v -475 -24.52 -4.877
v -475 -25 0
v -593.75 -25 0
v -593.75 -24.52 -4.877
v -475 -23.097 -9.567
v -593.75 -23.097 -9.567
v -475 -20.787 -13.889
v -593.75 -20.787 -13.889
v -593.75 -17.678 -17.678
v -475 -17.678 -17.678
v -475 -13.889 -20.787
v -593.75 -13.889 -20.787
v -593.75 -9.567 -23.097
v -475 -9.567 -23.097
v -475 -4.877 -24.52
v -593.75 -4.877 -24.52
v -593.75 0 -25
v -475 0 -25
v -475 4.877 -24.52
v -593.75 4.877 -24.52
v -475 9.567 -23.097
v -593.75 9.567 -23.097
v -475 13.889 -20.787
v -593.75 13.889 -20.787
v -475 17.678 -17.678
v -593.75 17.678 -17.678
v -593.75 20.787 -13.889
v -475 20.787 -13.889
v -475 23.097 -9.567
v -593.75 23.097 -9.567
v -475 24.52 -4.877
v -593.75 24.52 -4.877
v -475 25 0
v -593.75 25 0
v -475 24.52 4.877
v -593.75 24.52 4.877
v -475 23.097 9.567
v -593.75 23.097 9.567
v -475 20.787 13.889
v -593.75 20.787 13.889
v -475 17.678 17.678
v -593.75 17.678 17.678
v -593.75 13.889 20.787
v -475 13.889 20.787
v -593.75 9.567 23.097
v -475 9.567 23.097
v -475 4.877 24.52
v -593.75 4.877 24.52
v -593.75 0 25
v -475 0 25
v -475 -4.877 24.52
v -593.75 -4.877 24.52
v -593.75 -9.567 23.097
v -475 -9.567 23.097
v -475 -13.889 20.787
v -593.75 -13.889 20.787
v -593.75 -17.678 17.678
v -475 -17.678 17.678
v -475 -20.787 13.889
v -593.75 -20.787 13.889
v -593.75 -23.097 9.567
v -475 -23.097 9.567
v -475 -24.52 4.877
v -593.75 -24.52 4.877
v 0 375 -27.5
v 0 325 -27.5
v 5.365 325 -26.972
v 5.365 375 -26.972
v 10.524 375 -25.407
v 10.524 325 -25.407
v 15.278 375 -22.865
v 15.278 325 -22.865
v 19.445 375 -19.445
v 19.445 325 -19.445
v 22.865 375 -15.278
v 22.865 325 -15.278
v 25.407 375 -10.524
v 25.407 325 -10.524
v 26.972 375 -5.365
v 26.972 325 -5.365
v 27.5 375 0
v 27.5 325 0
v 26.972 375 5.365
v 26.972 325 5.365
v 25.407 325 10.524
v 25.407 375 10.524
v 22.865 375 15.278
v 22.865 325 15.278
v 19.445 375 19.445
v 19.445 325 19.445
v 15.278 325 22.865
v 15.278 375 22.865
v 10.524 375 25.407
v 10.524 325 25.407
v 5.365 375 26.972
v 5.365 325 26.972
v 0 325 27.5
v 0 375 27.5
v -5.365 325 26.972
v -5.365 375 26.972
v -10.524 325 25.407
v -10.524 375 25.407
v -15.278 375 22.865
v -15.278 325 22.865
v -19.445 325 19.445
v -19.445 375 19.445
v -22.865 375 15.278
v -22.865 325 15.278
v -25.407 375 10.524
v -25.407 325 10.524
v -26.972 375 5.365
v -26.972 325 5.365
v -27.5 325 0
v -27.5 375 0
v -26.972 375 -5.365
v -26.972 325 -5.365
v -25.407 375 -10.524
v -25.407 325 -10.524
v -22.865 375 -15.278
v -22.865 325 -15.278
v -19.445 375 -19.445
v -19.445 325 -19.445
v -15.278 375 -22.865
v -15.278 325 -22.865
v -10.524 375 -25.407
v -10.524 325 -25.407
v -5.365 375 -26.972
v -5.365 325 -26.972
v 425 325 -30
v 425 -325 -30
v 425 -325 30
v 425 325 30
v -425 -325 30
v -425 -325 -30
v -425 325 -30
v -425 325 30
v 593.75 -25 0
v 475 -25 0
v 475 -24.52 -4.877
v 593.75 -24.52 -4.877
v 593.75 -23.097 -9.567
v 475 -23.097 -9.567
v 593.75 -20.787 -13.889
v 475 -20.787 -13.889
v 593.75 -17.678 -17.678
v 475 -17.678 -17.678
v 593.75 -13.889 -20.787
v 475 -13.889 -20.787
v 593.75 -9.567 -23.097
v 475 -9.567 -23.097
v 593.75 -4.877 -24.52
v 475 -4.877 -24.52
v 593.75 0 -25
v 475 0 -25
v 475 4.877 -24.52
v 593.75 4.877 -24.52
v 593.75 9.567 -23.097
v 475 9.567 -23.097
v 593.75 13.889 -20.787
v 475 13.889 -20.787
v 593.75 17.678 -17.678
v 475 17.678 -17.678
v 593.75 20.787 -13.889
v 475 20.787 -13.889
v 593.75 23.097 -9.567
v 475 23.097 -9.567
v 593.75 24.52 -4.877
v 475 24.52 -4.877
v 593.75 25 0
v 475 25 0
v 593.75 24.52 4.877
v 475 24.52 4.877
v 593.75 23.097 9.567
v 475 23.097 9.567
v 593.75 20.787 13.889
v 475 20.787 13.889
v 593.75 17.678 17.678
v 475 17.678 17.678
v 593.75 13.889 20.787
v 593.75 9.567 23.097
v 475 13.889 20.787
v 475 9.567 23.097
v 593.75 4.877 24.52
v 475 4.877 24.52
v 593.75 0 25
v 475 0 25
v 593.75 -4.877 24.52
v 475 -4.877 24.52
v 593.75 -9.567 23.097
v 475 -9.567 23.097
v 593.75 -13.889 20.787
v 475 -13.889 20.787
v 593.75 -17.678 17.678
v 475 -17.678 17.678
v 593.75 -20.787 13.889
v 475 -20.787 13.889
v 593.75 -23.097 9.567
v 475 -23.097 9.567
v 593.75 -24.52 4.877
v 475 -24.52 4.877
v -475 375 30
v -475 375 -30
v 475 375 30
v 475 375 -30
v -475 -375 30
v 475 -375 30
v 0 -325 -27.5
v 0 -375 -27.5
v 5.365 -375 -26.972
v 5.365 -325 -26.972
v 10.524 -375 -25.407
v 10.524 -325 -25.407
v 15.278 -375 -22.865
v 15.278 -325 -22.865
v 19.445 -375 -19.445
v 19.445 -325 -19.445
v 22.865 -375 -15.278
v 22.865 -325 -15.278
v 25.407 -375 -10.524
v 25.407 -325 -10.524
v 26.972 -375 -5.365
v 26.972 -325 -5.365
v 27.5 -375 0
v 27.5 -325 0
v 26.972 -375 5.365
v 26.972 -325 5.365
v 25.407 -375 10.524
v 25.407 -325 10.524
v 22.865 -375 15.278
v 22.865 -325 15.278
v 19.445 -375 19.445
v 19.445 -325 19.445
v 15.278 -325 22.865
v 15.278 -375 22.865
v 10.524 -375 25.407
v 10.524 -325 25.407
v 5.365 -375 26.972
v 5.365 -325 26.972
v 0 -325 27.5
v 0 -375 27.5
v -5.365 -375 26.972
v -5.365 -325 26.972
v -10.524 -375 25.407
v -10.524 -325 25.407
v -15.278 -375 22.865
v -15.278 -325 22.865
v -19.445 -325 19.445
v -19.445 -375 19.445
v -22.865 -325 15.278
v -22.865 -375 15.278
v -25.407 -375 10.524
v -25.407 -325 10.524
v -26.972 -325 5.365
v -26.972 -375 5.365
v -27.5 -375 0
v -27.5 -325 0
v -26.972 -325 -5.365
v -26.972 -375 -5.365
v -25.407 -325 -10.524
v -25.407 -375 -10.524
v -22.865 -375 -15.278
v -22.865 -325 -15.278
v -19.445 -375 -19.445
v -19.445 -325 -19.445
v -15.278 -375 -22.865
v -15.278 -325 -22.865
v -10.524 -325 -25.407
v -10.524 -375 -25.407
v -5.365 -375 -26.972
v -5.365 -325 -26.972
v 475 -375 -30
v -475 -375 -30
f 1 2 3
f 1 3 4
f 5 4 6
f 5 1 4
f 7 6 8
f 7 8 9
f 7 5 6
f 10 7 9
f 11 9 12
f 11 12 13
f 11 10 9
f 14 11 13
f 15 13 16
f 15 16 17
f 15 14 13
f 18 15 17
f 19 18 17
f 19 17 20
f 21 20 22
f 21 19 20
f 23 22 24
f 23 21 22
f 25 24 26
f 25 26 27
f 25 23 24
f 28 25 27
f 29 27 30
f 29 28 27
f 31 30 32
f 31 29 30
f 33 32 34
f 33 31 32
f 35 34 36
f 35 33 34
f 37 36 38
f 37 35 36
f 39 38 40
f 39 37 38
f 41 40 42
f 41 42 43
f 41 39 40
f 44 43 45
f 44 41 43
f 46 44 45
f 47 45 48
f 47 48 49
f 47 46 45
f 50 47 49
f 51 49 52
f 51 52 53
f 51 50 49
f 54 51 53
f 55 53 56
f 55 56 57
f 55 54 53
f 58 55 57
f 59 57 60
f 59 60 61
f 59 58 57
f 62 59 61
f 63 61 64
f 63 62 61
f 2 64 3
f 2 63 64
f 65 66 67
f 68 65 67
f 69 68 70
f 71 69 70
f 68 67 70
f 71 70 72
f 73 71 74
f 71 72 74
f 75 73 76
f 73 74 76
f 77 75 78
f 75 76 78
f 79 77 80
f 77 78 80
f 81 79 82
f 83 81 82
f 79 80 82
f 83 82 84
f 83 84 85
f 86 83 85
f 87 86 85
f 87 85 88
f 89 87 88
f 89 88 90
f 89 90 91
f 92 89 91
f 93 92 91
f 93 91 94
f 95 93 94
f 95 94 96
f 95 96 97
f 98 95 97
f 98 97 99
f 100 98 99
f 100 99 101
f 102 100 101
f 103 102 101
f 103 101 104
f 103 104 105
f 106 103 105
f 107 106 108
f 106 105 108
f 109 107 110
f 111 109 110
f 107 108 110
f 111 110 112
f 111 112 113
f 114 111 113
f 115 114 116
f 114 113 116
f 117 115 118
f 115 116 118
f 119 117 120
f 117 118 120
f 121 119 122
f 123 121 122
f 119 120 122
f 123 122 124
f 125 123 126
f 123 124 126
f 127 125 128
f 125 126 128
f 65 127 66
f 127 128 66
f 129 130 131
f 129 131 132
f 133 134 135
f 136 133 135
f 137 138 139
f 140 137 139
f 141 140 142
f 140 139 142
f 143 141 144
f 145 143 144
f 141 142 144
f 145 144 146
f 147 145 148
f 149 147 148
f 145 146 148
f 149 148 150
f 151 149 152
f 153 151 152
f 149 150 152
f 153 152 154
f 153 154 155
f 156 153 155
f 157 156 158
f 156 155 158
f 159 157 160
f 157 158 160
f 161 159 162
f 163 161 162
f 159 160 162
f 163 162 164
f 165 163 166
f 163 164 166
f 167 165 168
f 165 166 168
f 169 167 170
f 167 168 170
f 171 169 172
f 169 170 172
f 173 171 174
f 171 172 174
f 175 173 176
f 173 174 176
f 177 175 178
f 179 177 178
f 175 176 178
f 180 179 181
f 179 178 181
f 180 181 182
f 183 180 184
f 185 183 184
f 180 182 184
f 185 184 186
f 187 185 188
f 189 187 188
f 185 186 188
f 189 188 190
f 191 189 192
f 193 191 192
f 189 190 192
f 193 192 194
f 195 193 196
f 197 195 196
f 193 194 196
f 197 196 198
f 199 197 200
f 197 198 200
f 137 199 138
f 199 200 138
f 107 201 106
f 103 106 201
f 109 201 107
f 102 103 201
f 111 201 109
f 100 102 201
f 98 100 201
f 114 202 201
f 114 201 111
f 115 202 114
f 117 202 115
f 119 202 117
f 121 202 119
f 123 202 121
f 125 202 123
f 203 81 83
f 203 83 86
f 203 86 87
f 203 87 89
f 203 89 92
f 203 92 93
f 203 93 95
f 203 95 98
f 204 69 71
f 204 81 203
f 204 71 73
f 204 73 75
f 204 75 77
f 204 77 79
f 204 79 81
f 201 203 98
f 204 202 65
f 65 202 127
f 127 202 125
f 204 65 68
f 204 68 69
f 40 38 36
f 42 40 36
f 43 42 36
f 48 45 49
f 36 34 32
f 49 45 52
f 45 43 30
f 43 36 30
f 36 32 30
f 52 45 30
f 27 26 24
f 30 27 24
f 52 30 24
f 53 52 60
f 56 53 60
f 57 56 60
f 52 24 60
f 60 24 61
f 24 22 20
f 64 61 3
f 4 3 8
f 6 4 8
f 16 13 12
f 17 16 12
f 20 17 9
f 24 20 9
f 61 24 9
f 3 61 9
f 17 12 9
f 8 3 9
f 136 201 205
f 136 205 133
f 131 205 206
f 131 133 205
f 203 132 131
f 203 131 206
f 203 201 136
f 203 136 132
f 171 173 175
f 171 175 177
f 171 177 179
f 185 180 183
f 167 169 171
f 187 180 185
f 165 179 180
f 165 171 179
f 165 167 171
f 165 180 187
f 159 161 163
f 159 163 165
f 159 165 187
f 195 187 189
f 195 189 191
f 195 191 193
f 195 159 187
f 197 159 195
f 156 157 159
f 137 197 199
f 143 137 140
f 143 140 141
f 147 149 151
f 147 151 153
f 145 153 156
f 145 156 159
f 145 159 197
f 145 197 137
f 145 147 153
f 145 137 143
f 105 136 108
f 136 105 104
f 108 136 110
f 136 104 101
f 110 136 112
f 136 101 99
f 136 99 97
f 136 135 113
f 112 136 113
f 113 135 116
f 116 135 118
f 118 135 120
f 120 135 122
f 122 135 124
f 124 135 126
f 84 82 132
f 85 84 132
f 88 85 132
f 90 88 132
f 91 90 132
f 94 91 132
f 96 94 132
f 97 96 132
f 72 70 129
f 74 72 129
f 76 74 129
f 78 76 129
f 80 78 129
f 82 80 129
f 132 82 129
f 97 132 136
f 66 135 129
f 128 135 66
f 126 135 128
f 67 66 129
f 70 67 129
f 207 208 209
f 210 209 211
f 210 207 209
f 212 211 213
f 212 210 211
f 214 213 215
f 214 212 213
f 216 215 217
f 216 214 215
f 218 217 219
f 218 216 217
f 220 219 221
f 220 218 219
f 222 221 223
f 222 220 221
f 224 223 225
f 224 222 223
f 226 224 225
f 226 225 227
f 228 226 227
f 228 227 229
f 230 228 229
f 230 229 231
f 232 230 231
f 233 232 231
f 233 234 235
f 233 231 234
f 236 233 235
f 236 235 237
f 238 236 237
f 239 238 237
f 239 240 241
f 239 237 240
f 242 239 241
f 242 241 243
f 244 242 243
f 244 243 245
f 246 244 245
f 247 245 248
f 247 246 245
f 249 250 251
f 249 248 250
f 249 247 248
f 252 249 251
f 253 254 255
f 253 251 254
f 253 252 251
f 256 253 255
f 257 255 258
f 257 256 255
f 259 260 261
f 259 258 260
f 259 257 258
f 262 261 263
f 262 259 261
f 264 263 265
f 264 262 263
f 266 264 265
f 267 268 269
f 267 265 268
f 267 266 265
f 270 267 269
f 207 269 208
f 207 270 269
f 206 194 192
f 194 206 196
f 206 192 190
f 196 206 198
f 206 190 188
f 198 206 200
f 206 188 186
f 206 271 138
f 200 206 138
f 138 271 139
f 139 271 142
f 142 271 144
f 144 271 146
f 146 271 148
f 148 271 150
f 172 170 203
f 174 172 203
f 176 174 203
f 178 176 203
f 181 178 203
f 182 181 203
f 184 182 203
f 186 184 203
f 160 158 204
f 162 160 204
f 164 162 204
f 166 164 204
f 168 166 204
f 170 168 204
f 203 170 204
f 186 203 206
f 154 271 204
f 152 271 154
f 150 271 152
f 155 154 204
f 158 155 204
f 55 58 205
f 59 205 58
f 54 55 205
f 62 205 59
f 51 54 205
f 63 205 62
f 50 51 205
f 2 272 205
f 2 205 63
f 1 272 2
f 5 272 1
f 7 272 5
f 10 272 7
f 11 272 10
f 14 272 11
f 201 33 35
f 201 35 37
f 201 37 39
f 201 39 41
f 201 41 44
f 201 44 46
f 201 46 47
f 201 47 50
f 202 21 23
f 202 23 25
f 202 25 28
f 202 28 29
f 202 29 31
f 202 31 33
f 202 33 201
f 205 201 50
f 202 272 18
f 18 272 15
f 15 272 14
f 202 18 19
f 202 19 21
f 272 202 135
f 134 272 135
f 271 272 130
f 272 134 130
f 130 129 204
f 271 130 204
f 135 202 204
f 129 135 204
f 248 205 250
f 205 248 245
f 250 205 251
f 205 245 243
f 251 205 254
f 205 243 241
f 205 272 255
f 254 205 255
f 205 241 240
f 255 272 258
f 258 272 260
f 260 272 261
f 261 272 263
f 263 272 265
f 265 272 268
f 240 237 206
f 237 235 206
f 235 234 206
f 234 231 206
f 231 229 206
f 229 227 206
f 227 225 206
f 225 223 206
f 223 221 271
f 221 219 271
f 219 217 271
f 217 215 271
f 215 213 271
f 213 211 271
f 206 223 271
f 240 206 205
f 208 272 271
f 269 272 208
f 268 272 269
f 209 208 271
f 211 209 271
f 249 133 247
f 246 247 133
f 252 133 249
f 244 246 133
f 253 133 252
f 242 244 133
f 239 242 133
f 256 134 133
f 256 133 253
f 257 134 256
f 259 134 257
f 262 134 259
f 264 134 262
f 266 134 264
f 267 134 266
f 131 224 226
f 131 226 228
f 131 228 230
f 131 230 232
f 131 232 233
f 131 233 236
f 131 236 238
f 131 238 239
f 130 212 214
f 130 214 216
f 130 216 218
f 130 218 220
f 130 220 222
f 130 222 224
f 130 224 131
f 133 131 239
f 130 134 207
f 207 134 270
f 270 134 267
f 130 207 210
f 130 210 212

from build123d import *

# Parameters (mm, degrees)
BOSS_EXTRUDE1_DEPTH      = 30
BOSS_EXTRUDE1_DEPTH_BACK = 30
SKETCH1_W                = 950
SKETCH1_H                = 750
SKETCH1_W_2              = 850
SKETCH1_H_2              = 650
SKETCH3_R                = 25
BOSS_EXTRUDE2_DEPTH      = 118.75
SKETCH4_R                = 27.5
CUT_EXTRUDE2_DEPTH       = 85


with BuildPart() as part:
    # Sketch1 → Boss-Extrude1 (new, two sides: drawn at the far end of the back side and taken through both)
    with BuildSketch(Plane.XY.offset(-BOSS_EXTRUDE1_DEPTH_BACK)):
        Rectangle(SKETCH1_W, SKETCH1_H)
        Rectangle(SKETCH1_W_2, SKETCH1_H_2, mode=Mode.SUBTRACT)
    extrude(amount=BOSS_EXTRUDE1_DEPTH + BOSS_EXTRUDE1_DEPTH_BACK)

    # Sketch3 → Boss-Extrude2 (add)
    with BuildSketch(Plane(origin=(475, 0, 0), x_dir=(0, 0, -1), z_dir=(1, 0, 0))):
        Circle(SKETCH3_R)
    boss_extrude2 = extrude(amount=BOSS_EXTRUDE2_DEPTH)

    # Mirror2: Boss-Extrude2 across plane
    add(boss_extrude2.mirror(Plane(origin=(0, 0, 0), x_dir=(0, 0, 1), z_dir=(1, 0, 0))))

    # Sketch4 → Cut-Extrude2 (cut)
    with BuildSketch(Plane.XZ.offset(-325)):
        Circle(SKETCH4_R)
    cut_extrude2 = extrude(amount=-CUT_EXTRUDE2_DEPTH, mode=Mode.SUBTRACT)

    # Mirror3: Cut-Extrude2 across plane
    add(cut_extrude2.mirror(Plane.ZX), mode=Mode.SUBTRACT)


solid = part.part
